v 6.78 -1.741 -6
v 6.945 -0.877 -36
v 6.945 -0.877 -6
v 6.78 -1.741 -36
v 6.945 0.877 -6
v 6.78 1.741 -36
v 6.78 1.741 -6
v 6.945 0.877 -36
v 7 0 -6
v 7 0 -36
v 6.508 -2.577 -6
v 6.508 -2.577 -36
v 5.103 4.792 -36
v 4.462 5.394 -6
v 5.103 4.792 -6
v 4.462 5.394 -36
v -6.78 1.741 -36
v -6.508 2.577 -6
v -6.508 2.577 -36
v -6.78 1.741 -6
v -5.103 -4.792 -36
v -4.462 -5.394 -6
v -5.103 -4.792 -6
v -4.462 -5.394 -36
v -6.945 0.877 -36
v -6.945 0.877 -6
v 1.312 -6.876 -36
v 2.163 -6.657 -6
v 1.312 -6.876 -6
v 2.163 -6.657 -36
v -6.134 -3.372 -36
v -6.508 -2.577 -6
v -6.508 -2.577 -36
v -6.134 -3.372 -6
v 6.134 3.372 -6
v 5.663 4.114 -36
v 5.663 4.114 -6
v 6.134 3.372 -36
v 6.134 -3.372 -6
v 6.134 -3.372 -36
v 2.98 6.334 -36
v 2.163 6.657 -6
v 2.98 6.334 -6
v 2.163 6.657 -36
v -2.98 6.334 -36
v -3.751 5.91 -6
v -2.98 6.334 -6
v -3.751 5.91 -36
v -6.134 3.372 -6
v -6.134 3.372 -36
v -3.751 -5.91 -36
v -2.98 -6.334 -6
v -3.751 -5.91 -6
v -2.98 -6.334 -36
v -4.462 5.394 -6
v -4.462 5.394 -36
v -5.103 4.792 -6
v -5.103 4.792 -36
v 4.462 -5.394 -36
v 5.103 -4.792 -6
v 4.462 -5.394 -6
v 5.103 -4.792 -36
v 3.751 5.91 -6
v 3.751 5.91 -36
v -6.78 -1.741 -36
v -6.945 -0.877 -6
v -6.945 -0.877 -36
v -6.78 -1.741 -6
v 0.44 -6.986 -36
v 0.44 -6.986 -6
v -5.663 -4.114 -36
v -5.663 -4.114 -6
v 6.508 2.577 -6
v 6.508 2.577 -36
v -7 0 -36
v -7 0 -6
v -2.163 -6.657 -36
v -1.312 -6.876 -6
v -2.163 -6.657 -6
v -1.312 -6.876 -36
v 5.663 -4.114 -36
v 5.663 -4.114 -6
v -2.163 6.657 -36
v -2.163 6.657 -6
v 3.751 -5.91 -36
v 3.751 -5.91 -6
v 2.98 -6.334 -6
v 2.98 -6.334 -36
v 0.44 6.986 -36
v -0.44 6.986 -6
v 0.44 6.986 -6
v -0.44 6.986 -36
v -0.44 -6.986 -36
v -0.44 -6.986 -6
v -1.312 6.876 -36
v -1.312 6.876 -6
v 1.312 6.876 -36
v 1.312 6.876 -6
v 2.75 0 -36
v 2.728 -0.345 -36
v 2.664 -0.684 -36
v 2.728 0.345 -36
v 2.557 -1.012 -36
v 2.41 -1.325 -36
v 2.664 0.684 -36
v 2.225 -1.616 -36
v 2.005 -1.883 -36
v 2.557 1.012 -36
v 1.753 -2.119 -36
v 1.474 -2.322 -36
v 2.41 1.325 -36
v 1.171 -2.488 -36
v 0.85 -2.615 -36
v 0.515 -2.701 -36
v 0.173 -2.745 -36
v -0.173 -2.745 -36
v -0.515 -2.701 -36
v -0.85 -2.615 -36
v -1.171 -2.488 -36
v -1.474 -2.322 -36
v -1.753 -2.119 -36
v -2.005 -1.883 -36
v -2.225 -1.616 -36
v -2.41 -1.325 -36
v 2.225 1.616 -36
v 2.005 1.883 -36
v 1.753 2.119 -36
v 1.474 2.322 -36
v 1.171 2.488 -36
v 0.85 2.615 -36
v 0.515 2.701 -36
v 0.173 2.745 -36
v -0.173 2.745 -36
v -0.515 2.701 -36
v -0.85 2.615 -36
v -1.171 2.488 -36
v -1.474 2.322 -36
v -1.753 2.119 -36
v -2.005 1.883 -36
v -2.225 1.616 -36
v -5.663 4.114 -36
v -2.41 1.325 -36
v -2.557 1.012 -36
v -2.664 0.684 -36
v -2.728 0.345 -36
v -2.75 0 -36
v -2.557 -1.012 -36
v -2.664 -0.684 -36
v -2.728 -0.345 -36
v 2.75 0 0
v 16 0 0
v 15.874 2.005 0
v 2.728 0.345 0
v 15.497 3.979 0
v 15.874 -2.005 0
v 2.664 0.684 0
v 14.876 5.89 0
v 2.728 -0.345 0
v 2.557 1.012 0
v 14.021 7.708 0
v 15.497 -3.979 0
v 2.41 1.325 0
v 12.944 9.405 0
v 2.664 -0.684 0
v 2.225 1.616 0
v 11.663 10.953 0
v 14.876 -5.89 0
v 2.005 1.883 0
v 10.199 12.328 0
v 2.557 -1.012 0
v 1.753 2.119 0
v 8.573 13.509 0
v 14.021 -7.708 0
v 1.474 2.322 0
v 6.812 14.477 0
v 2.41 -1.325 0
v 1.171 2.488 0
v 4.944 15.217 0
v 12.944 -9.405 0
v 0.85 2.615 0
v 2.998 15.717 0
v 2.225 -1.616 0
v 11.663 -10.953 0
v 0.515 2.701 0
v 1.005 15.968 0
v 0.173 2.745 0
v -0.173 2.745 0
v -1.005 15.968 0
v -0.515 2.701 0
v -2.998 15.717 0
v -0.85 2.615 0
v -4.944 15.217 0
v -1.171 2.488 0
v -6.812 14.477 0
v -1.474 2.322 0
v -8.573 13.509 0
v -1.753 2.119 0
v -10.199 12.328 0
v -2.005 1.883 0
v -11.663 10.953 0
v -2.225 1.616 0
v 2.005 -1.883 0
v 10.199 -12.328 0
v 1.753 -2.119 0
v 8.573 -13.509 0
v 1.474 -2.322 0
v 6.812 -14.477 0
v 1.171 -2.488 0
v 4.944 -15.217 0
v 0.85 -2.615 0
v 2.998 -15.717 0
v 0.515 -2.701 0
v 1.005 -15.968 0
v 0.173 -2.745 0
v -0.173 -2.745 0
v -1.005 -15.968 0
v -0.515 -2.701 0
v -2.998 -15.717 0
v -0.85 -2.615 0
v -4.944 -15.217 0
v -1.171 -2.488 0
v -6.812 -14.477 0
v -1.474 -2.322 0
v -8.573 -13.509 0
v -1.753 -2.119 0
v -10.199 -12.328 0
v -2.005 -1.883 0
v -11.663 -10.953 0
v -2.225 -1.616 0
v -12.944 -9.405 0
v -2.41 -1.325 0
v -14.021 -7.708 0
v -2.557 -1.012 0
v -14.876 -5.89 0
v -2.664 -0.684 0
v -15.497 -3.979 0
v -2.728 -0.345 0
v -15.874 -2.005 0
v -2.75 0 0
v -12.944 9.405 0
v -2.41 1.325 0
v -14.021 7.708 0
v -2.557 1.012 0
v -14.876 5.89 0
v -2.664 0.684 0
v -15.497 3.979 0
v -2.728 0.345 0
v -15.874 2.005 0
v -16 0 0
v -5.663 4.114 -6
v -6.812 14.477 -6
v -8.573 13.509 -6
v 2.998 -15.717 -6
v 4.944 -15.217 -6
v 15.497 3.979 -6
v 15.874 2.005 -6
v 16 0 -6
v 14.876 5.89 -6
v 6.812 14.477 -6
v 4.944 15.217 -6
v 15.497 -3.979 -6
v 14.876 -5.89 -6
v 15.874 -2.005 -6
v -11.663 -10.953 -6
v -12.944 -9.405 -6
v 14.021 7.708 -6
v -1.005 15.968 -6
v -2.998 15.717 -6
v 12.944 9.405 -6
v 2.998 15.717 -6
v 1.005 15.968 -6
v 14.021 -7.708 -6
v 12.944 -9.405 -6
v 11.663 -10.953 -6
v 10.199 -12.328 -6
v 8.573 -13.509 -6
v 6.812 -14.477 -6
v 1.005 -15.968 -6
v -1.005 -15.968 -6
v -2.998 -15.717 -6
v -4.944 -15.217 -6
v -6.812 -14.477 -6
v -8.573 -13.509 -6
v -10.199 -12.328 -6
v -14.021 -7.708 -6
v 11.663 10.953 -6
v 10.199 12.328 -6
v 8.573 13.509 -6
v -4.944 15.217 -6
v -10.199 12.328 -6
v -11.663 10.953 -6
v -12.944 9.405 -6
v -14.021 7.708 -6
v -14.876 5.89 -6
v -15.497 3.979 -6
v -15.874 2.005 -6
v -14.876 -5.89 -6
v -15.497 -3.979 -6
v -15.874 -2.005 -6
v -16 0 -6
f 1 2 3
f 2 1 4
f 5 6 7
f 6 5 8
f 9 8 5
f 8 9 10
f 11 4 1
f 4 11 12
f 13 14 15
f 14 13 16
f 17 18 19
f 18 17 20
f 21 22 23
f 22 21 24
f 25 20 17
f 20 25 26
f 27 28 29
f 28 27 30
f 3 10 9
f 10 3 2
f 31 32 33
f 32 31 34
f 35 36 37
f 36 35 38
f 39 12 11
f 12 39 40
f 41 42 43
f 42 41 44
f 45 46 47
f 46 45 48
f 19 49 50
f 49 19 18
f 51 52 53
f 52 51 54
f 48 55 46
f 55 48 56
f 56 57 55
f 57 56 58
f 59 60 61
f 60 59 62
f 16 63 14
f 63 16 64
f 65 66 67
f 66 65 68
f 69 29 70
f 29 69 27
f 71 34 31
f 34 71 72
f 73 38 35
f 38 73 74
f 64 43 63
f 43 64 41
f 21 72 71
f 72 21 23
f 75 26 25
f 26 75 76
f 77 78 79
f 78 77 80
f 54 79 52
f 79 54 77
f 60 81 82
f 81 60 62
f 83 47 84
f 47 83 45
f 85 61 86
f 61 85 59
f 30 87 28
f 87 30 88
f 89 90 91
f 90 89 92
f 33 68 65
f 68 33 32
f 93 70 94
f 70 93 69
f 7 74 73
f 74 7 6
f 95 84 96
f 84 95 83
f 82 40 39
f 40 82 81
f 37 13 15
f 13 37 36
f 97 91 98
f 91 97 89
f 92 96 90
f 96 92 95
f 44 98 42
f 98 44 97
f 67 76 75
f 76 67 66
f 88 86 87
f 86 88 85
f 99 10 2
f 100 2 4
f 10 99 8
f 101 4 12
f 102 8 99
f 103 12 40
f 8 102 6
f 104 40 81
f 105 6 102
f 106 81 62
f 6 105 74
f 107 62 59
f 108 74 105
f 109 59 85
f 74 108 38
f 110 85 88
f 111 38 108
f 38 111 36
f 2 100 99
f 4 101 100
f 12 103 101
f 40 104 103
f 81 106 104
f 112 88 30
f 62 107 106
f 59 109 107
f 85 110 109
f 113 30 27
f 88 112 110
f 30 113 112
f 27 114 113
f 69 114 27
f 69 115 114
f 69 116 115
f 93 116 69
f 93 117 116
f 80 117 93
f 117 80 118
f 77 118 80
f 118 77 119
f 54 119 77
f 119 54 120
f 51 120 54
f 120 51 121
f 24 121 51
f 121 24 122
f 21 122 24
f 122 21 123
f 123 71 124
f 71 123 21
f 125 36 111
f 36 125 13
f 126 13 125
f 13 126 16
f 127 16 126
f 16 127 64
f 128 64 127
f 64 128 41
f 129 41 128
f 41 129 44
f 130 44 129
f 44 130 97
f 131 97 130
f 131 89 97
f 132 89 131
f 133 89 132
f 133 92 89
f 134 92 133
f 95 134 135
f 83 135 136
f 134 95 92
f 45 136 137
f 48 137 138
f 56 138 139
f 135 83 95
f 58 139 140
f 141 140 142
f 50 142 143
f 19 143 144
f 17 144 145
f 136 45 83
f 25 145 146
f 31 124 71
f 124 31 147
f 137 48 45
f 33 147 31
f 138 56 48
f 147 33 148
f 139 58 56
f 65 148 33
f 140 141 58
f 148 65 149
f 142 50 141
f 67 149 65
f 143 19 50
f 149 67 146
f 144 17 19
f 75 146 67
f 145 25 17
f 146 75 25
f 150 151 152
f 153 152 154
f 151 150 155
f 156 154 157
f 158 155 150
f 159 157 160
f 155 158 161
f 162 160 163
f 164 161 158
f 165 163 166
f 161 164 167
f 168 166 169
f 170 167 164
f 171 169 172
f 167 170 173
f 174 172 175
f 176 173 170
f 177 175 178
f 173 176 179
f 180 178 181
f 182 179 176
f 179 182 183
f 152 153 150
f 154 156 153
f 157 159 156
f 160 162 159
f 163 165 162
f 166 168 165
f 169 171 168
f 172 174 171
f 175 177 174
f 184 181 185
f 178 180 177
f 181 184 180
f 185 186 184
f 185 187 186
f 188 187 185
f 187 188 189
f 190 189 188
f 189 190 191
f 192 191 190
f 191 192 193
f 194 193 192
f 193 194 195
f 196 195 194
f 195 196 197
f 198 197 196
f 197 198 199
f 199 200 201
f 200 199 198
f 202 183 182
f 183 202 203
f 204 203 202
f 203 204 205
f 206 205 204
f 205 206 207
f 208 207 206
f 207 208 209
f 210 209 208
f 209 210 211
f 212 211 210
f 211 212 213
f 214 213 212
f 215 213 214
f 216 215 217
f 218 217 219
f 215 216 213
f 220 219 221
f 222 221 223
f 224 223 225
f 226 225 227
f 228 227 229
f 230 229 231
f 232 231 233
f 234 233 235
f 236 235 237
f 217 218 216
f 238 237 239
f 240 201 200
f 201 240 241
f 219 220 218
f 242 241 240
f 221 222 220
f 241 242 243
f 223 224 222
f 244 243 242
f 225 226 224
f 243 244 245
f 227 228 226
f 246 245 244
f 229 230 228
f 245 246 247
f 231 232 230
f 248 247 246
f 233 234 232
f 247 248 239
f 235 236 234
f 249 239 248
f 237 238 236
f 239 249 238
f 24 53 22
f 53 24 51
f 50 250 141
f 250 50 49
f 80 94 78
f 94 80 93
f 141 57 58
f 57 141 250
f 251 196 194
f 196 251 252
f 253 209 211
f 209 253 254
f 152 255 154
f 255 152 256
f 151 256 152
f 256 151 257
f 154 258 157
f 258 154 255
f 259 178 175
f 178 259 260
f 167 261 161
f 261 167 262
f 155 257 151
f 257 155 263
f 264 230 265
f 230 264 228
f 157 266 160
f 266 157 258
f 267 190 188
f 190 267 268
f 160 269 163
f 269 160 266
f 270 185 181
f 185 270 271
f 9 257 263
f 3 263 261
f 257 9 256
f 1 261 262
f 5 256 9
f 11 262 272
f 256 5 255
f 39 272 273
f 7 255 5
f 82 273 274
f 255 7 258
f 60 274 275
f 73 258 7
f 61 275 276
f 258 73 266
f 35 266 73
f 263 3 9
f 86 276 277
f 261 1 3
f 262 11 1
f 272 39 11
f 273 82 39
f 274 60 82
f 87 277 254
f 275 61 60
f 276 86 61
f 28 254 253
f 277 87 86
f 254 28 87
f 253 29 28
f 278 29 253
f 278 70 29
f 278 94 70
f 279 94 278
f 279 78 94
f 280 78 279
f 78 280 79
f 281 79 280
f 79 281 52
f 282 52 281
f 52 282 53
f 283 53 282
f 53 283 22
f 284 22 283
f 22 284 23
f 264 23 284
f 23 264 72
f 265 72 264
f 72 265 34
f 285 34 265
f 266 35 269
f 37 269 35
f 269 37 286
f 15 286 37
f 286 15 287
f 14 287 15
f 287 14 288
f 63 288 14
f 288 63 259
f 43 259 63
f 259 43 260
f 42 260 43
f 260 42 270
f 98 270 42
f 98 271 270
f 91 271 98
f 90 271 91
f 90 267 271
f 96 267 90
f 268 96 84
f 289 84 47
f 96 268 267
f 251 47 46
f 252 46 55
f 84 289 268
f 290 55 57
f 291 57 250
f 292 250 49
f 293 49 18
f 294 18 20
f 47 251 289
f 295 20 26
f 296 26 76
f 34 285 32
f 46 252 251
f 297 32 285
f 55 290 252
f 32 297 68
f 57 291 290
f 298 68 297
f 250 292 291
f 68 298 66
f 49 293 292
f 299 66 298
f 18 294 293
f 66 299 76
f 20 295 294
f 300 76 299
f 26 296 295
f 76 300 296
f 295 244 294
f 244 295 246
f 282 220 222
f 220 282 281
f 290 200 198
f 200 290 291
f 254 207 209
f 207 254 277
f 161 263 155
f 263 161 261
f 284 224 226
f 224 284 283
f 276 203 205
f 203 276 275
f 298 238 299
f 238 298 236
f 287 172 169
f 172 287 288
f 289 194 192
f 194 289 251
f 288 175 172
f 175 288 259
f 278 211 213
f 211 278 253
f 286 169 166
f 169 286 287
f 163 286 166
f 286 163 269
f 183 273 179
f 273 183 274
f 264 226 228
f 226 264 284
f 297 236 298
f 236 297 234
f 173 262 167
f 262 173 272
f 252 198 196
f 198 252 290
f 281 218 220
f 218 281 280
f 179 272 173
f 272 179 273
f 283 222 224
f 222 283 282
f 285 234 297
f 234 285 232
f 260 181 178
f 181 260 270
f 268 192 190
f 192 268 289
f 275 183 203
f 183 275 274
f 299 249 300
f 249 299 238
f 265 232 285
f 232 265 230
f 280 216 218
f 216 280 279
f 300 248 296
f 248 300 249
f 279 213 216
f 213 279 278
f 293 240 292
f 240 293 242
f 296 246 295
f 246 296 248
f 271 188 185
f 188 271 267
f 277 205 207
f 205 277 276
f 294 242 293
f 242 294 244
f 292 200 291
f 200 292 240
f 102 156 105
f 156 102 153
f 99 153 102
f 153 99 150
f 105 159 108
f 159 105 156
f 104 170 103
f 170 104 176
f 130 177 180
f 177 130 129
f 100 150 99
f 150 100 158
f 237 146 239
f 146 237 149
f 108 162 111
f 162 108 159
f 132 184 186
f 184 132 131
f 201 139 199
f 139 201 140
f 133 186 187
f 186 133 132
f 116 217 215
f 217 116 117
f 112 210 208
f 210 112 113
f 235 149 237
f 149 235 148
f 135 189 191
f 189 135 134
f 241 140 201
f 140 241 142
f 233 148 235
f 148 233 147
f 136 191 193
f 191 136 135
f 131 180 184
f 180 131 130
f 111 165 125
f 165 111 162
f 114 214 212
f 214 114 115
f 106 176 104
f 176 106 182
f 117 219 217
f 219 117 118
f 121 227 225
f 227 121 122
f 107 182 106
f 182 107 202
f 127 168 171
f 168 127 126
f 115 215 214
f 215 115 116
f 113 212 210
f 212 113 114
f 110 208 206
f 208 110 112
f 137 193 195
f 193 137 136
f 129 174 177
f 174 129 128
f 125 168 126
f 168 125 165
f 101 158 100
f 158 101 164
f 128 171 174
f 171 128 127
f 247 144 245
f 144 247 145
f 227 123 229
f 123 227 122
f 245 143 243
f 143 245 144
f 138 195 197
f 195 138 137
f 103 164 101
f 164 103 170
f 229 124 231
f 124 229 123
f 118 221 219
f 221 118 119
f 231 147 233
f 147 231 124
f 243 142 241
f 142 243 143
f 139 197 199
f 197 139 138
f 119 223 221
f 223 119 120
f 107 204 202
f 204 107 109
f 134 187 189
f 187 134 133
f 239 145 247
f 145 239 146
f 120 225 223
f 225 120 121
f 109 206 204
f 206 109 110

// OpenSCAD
$fn = 50;


difference() {
	union() {
		translate(v = [0, 0, -36.0000000000]) {
			cylinder(h = 36, r = 7.0000000000);
		}
		translate(v = [0, 0, -6.0000000000]) {
			cylinder(h = 6, r = 16.0000000000);
		}
	}
	union() {
		#translate(v = [0, 0, -36]) {
			cylinder(h = 36, r = 2.7500000000);
		}
	}
}
